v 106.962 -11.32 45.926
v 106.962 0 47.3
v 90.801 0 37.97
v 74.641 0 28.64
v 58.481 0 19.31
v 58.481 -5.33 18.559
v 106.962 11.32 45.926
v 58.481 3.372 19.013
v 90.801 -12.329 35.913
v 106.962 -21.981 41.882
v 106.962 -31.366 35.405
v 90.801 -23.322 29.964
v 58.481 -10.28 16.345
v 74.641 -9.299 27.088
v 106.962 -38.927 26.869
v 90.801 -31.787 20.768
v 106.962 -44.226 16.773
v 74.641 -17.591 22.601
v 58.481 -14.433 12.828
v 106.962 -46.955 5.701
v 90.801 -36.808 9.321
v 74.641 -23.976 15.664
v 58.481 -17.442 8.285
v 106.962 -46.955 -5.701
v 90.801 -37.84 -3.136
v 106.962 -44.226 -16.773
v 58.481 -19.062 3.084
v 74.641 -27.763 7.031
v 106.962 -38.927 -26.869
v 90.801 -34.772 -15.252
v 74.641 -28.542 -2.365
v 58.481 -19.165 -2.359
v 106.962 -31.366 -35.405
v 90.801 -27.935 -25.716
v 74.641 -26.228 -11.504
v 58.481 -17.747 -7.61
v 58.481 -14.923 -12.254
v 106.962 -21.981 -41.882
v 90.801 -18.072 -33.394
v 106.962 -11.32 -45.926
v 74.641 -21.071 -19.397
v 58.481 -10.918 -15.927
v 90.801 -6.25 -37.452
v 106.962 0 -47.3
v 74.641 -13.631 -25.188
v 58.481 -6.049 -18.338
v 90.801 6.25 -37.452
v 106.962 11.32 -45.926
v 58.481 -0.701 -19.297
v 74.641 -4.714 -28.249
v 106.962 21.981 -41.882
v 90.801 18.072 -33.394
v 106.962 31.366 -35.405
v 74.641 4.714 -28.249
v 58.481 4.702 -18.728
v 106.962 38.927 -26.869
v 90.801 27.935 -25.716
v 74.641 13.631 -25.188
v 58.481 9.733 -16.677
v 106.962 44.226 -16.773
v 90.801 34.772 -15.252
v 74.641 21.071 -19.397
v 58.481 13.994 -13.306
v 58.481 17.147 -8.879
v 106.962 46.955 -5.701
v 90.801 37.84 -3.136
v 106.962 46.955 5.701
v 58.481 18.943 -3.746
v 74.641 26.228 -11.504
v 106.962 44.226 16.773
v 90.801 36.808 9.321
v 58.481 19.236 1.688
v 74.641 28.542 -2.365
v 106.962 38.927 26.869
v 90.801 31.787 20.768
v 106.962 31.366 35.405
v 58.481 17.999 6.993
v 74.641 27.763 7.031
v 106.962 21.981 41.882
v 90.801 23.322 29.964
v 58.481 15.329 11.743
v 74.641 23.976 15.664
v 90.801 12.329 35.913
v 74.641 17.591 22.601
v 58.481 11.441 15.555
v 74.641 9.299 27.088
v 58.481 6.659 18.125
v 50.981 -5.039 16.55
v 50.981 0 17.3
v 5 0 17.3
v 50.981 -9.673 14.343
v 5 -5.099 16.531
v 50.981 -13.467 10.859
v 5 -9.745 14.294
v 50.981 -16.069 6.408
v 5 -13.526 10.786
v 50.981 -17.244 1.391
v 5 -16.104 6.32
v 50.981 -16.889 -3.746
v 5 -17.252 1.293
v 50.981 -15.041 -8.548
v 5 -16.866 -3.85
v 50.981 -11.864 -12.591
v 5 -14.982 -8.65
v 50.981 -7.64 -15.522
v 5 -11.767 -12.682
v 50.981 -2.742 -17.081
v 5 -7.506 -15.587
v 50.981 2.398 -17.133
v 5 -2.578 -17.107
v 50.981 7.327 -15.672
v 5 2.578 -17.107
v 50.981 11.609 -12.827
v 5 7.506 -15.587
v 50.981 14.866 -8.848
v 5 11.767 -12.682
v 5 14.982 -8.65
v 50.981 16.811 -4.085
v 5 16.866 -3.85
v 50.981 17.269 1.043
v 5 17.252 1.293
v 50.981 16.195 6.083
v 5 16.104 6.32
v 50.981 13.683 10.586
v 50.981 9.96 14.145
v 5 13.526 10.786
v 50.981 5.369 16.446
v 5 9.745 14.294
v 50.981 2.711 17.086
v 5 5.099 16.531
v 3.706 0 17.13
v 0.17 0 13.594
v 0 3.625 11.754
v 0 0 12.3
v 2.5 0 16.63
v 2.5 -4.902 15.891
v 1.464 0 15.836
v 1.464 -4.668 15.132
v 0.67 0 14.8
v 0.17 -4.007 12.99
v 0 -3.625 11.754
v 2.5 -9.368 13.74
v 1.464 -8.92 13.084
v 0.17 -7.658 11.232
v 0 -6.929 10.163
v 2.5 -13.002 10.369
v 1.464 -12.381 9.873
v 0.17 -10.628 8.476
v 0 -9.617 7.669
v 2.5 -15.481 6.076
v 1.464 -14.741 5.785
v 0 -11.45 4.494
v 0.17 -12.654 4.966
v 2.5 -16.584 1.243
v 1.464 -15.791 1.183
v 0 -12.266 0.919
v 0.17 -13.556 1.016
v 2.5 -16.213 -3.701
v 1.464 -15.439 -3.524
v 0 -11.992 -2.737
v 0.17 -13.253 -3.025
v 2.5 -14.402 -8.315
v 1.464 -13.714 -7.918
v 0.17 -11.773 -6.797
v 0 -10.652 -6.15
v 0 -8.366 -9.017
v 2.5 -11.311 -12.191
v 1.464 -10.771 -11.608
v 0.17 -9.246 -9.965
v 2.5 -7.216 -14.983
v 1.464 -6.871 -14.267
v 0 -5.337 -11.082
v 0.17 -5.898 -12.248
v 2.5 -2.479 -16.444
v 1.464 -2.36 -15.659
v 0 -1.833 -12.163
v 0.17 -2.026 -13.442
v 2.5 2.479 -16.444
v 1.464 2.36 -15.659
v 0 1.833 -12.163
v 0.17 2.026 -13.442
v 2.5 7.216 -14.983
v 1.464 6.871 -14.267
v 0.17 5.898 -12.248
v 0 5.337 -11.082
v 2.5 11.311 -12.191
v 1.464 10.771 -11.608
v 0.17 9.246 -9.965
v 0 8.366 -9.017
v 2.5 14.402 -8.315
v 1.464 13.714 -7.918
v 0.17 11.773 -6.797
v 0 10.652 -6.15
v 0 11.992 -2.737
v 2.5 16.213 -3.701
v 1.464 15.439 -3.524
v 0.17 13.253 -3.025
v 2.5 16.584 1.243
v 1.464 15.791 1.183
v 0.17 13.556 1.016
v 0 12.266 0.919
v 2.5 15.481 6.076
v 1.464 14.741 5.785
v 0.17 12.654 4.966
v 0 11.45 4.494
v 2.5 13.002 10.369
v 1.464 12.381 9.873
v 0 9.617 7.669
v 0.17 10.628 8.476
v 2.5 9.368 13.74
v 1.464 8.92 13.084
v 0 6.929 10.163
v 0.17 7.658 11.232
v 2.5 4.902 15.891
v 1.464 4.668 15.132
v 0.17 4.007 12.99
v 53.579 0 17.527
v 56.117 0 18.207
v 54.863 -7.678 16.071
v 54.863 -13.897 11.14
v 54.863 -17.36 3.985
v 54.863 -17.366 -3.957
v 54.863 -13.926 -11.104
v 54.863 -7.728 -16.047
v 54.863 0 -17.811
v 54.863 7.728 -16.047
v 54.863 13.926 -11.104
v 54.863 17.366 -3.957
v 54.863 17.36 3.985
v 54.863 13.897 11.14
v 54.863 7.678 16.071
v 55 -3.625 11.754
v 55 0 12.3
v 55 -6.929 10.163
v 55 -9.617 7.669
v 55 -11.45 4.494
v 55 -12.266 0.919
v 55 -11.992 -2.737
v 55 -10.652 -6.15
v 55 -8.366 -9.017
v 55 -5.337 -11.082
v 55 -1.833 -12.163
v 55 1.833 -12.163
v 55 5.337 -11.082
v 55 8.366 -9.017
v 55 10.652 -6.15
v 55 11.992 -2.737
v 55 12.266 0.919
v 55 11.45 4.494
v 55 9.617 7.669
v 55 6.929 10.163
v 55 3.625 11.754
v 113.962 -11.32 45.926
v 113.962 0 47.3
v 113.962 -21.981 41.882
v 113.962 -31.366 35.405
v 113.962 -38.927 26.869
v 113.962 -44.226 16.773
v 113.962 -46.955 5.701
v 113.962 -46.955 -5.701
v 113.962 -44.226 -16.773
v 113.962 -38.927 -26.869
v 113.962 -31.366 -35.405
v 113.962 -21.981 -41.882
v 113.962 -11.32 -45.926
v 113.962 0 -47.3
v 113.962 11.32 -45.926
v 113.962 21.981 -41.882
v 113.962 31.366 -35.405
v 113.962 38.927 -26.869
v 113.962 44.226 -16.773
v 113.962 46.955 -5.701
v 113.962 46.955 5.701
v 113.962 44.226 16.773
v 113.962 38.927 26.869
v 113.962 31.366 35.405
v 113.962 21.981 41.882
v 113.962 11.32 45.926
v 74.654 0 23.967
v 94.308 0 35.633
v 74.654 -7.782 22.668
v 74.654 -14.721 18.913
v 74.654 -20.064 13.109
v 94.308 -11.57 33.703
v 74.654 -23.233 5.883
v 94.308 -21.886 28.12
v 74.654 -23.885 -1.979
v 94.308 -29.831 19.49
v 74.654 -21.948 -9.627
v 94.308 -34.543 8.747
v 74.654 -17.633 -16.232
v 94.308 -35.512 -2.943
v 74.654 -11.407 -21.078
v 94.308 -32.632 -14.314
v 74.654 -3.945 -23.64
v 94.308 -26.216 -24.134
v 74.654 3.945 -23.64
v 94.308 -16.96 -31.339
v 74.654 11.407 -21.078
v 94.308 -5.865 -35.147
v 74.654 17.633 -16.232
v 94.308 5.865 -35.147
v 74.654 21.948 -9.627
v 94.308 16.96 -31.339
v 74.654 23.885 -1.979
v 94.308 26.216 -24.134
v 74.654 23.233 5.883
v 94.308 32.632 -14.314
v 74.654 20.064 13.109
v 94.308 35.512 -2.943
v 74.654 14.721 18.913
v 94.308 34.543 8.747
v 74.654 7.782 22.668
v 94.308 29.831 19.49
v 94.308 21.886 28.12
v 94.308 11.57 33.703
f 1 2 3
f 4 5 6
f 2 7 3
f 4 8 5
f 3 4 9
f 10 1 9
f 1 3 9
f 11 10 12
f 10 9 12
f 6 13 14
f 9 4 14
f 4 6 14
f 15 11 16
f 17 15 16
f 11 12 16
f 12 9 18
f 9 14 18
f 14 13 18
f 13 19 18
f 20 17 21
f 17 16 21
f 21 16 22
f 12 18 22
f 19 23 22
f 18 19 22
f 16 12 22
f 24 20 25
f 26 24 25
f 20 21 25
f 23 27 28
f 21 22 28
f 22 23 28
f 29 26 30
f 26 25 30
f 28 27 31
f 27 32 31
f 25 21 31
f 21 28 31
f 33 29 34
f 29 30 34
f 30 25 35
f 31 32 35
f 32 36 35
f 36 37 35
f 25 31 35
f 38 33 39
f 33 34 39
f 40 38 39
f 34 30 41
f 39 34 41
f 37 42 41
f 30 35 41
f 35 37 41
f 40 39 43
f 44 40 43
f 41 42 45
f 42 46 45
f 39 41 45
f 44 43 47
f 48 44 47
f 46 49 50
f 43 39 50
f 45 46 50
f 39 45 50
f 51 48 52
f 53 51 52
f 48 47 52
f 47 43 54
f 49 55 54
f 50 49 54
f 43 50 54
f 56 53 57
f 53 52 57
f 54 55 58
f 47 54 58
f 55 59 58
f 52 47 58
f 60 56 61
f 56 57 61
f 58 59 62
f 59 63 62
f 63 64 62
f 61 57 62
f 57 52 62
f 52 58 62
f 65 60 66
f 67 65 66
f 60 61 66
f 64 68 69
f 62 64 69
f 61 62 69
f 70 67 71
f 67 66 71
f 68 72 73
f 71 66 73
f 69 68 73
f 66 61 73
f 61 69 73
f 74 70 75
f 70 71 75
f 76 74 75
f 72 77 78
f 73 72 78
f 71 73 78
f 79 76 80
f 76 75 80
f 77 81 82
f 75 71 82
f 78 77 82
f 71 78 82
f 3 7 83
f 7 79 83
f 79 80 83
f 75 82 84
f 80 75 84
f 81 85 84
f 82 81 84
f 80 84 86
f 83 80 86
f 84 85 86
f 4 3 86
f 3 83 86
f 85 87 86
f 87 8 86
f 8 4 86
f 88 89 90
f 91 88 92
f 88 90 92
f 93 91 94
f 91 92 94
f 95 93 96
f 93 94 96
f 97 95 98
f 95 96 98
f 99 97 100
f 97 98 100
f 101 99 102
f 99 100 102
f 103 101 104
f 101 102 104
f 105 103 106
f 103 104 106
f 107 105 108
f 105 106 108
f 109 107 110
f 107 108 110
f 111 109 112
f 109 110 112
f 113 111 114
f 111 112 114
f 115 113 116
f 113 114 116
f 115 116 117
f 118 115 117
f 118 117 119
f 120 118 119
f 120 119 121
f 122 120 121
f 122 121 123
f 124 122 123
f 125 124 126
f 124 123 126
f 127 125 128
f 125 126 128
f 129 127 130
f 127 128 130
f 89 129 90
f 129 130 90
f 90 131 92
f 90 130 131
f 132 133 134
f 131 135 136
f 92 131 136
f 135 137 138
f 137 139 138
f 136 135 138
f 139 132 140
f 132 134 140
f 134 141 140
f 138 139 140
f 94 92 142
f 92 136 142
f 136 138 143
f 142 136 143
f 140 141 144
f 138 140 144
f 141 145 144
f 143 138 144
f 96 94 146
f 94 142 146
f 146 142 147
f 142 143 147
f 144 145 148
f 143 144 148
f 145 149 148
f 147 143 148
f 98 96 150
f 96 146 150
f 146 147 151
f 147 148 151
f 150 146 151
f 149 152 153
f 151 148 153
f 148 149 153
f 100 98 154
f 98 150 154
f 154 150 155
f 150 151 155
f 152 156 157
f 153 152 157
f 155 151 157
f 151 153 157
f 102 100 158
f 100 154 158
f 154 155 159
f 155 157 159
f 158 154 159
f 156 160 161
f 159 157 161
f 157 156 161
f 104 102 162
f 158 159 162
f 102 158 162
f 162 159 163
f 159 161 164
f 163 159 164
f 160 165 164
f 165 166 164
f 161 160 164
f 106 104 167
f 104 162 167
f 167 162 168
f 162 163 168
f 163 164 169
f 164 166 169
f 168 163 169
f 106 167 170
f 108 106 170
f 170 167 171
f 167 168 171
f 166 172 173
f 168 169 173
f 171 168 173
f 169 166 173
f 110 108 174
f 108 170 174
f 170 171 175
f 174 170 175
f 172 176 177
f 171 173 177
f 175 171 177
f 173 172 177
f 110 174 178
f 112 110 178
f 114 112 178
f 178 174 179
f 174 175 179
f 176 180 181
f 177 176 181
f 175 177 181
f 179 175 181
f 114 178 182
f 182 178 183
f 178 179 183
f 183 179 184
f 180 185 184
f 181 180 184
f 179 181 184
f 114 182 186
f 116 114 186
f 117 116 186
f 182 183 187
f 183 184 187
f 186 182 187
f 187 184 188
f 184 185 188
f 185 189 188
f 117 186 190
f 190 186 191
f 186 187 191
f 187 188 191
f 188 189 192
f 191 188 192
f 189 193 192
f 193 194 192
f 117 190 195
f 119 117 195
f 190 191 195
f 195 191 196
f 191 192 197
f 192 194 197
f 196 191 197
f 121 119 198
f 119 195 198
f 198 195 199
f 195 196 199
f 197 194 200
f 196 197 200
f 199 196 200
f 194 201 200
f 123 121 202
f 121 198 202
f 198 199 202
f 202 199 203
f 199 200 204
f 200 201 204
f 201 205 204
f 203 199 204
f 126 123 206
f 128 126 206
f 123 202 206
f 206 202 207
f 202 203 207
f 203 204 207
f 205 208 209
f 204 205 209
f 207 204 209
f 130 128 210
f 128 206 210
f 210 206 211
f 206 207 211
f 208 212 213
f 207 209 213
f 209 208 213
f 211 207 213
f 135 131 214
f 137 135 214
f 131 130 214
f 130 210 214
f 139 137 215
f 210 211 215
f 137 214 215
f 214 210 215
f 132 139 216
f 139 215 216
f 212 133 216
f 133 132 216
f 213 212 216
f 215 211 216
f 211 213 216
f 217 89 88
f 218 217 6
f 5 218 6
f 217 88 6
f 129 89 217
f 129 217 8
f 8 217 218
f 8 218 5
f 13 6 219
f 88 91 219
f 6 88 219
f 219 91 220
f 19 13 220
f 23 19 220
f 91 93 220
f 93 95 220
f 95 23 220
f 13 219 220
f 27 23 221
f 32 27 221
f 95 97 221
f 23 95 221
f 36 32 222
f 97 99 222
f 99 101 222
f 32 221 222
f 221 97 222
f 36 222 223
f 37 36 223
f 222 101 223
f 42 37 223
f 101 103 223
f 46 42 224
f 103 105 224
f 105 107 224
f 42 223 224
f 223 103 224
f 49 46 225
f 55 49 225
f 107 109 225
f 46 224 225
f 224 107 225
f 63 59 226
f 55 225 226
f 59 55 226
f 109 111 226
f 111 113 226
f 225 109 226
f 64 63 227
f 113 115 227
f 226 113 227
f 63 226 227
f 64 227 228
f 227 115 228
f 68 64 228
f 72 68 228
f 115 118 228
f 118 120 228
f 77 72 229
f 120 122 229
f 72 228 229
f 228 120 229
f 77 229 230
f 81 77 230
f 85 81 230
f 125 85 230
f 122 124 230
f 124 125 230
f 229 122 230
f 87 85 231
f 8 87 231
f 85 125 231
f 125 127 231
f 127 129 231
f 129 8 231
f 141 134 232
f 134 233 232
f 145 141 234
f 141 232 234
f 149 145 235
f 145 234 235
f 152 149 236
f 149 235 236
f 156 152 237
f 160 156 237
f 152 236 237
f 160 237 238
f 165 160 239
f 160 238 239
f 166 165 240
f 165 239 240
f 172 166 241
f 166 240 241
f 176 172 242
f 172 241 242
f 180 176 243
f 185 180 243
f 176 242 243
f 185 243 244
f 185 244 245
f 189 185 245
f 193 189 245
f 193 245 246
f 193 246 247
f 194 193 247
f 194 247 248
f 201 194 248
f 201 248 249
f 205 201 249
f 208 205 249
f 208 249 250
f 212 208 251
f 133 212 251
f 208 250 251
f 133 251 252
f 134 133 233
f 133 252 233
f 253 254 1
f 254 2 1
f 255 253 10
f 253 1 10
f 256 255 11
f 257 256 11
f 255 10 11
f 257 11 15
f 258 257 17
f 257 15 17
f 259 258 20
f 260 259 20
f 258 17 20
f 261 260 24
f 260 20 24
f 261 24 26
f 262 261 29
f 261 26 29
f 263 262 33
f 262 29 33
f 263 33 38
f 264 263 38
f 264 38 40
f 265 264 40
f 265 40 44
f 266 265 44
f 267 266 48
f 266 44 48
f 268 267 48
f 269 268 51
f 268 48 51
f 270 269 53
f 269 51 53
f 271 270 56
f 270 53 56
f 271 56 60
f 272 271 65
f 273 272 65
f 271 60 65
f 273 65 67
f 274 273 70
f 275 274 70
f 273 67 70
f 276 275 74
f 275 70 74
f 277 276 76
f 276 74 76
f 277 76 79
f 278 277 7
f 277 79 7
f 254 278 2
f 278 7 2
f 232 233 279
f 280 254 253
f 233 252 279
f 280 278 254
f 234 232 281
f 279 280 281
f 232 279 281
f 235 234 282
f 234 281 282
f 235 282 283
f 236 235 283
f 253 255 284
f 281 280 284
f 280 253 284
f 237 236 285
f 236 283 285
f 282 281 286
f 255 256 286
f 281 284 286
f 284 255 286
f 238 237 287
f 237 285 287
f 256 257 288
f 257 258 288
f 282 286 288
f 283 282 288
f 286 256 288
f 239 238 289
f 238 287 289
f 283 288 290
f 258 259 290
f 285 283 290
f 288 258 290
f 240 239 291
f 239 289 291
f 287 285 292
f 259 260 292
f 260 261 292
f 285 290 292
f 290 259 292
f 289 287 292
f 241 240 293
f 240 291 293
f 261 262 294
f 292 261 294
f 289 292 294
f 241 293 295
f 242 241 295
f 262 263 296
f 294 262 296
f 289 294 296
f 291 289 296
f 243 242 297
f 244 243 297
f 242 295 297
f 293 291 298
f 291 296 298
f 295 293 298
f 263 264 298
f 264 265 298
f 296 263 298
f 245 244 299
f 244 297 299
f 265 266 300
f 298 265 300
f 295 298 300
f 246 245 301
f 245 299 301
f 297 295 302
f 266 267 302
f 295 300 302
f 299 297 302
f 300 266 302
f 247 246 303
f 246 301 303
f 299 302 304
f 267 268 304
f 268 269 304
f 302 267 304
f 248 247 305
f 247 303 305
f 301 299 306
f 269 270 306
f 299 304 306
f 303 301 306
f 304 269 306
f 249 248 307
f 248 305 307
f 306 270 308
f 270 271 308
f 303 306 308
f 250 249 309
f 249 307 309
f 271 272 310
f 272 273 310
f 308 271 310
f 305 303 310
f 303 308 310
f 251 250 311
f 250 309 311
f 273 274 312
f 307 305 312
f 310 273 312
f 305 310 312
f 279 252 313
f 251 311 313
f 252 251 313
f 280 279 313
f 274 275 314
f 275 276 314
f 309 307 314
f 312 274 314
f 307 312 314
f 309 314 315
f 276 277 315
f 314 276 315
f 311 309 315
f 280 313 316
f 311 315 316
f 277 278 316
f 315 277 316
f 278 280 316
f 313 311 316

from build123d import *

# Parameters (mm, degrees)
F2_R = 4.99999
F3_R = 15


# Not quite as in the source:
# - a fillet or chamfer is up to 0.001 mm smaller than in the source, because OpenCascade refuses the exact size


with BuildPart() as f1:
    # F0 (on Front) → F1 (revolve)
    with BuildSketch(Plane.XZ):
        Polygon((55, 17.3), (0, 17.3), (0, 12.3), (55, 12.3), (113.9615242271, 47.3), (106.9615242271, 47.3), align=None)
    revolve(axis=Axis((19.2044641059, 0, 0), (1, 0, 0)))

    # F2 (radius 5 in the source; OpenCascade refuses exactly that, so slightly less here)
    f2_edges = [f1.edges().sort_by_distance(p)[0] for p in [
        (0, 0, -17.3),
    ]]
    fillet(f2_edges, radius=F2_R)

    # F3
    f3_edges = [f1.edges().sort_by_distance(p)[0] for p in [
        (55, 0, -17.3),
    ]]
    fillet(f3_edges, radius=F3_R)


solid = f1.part
